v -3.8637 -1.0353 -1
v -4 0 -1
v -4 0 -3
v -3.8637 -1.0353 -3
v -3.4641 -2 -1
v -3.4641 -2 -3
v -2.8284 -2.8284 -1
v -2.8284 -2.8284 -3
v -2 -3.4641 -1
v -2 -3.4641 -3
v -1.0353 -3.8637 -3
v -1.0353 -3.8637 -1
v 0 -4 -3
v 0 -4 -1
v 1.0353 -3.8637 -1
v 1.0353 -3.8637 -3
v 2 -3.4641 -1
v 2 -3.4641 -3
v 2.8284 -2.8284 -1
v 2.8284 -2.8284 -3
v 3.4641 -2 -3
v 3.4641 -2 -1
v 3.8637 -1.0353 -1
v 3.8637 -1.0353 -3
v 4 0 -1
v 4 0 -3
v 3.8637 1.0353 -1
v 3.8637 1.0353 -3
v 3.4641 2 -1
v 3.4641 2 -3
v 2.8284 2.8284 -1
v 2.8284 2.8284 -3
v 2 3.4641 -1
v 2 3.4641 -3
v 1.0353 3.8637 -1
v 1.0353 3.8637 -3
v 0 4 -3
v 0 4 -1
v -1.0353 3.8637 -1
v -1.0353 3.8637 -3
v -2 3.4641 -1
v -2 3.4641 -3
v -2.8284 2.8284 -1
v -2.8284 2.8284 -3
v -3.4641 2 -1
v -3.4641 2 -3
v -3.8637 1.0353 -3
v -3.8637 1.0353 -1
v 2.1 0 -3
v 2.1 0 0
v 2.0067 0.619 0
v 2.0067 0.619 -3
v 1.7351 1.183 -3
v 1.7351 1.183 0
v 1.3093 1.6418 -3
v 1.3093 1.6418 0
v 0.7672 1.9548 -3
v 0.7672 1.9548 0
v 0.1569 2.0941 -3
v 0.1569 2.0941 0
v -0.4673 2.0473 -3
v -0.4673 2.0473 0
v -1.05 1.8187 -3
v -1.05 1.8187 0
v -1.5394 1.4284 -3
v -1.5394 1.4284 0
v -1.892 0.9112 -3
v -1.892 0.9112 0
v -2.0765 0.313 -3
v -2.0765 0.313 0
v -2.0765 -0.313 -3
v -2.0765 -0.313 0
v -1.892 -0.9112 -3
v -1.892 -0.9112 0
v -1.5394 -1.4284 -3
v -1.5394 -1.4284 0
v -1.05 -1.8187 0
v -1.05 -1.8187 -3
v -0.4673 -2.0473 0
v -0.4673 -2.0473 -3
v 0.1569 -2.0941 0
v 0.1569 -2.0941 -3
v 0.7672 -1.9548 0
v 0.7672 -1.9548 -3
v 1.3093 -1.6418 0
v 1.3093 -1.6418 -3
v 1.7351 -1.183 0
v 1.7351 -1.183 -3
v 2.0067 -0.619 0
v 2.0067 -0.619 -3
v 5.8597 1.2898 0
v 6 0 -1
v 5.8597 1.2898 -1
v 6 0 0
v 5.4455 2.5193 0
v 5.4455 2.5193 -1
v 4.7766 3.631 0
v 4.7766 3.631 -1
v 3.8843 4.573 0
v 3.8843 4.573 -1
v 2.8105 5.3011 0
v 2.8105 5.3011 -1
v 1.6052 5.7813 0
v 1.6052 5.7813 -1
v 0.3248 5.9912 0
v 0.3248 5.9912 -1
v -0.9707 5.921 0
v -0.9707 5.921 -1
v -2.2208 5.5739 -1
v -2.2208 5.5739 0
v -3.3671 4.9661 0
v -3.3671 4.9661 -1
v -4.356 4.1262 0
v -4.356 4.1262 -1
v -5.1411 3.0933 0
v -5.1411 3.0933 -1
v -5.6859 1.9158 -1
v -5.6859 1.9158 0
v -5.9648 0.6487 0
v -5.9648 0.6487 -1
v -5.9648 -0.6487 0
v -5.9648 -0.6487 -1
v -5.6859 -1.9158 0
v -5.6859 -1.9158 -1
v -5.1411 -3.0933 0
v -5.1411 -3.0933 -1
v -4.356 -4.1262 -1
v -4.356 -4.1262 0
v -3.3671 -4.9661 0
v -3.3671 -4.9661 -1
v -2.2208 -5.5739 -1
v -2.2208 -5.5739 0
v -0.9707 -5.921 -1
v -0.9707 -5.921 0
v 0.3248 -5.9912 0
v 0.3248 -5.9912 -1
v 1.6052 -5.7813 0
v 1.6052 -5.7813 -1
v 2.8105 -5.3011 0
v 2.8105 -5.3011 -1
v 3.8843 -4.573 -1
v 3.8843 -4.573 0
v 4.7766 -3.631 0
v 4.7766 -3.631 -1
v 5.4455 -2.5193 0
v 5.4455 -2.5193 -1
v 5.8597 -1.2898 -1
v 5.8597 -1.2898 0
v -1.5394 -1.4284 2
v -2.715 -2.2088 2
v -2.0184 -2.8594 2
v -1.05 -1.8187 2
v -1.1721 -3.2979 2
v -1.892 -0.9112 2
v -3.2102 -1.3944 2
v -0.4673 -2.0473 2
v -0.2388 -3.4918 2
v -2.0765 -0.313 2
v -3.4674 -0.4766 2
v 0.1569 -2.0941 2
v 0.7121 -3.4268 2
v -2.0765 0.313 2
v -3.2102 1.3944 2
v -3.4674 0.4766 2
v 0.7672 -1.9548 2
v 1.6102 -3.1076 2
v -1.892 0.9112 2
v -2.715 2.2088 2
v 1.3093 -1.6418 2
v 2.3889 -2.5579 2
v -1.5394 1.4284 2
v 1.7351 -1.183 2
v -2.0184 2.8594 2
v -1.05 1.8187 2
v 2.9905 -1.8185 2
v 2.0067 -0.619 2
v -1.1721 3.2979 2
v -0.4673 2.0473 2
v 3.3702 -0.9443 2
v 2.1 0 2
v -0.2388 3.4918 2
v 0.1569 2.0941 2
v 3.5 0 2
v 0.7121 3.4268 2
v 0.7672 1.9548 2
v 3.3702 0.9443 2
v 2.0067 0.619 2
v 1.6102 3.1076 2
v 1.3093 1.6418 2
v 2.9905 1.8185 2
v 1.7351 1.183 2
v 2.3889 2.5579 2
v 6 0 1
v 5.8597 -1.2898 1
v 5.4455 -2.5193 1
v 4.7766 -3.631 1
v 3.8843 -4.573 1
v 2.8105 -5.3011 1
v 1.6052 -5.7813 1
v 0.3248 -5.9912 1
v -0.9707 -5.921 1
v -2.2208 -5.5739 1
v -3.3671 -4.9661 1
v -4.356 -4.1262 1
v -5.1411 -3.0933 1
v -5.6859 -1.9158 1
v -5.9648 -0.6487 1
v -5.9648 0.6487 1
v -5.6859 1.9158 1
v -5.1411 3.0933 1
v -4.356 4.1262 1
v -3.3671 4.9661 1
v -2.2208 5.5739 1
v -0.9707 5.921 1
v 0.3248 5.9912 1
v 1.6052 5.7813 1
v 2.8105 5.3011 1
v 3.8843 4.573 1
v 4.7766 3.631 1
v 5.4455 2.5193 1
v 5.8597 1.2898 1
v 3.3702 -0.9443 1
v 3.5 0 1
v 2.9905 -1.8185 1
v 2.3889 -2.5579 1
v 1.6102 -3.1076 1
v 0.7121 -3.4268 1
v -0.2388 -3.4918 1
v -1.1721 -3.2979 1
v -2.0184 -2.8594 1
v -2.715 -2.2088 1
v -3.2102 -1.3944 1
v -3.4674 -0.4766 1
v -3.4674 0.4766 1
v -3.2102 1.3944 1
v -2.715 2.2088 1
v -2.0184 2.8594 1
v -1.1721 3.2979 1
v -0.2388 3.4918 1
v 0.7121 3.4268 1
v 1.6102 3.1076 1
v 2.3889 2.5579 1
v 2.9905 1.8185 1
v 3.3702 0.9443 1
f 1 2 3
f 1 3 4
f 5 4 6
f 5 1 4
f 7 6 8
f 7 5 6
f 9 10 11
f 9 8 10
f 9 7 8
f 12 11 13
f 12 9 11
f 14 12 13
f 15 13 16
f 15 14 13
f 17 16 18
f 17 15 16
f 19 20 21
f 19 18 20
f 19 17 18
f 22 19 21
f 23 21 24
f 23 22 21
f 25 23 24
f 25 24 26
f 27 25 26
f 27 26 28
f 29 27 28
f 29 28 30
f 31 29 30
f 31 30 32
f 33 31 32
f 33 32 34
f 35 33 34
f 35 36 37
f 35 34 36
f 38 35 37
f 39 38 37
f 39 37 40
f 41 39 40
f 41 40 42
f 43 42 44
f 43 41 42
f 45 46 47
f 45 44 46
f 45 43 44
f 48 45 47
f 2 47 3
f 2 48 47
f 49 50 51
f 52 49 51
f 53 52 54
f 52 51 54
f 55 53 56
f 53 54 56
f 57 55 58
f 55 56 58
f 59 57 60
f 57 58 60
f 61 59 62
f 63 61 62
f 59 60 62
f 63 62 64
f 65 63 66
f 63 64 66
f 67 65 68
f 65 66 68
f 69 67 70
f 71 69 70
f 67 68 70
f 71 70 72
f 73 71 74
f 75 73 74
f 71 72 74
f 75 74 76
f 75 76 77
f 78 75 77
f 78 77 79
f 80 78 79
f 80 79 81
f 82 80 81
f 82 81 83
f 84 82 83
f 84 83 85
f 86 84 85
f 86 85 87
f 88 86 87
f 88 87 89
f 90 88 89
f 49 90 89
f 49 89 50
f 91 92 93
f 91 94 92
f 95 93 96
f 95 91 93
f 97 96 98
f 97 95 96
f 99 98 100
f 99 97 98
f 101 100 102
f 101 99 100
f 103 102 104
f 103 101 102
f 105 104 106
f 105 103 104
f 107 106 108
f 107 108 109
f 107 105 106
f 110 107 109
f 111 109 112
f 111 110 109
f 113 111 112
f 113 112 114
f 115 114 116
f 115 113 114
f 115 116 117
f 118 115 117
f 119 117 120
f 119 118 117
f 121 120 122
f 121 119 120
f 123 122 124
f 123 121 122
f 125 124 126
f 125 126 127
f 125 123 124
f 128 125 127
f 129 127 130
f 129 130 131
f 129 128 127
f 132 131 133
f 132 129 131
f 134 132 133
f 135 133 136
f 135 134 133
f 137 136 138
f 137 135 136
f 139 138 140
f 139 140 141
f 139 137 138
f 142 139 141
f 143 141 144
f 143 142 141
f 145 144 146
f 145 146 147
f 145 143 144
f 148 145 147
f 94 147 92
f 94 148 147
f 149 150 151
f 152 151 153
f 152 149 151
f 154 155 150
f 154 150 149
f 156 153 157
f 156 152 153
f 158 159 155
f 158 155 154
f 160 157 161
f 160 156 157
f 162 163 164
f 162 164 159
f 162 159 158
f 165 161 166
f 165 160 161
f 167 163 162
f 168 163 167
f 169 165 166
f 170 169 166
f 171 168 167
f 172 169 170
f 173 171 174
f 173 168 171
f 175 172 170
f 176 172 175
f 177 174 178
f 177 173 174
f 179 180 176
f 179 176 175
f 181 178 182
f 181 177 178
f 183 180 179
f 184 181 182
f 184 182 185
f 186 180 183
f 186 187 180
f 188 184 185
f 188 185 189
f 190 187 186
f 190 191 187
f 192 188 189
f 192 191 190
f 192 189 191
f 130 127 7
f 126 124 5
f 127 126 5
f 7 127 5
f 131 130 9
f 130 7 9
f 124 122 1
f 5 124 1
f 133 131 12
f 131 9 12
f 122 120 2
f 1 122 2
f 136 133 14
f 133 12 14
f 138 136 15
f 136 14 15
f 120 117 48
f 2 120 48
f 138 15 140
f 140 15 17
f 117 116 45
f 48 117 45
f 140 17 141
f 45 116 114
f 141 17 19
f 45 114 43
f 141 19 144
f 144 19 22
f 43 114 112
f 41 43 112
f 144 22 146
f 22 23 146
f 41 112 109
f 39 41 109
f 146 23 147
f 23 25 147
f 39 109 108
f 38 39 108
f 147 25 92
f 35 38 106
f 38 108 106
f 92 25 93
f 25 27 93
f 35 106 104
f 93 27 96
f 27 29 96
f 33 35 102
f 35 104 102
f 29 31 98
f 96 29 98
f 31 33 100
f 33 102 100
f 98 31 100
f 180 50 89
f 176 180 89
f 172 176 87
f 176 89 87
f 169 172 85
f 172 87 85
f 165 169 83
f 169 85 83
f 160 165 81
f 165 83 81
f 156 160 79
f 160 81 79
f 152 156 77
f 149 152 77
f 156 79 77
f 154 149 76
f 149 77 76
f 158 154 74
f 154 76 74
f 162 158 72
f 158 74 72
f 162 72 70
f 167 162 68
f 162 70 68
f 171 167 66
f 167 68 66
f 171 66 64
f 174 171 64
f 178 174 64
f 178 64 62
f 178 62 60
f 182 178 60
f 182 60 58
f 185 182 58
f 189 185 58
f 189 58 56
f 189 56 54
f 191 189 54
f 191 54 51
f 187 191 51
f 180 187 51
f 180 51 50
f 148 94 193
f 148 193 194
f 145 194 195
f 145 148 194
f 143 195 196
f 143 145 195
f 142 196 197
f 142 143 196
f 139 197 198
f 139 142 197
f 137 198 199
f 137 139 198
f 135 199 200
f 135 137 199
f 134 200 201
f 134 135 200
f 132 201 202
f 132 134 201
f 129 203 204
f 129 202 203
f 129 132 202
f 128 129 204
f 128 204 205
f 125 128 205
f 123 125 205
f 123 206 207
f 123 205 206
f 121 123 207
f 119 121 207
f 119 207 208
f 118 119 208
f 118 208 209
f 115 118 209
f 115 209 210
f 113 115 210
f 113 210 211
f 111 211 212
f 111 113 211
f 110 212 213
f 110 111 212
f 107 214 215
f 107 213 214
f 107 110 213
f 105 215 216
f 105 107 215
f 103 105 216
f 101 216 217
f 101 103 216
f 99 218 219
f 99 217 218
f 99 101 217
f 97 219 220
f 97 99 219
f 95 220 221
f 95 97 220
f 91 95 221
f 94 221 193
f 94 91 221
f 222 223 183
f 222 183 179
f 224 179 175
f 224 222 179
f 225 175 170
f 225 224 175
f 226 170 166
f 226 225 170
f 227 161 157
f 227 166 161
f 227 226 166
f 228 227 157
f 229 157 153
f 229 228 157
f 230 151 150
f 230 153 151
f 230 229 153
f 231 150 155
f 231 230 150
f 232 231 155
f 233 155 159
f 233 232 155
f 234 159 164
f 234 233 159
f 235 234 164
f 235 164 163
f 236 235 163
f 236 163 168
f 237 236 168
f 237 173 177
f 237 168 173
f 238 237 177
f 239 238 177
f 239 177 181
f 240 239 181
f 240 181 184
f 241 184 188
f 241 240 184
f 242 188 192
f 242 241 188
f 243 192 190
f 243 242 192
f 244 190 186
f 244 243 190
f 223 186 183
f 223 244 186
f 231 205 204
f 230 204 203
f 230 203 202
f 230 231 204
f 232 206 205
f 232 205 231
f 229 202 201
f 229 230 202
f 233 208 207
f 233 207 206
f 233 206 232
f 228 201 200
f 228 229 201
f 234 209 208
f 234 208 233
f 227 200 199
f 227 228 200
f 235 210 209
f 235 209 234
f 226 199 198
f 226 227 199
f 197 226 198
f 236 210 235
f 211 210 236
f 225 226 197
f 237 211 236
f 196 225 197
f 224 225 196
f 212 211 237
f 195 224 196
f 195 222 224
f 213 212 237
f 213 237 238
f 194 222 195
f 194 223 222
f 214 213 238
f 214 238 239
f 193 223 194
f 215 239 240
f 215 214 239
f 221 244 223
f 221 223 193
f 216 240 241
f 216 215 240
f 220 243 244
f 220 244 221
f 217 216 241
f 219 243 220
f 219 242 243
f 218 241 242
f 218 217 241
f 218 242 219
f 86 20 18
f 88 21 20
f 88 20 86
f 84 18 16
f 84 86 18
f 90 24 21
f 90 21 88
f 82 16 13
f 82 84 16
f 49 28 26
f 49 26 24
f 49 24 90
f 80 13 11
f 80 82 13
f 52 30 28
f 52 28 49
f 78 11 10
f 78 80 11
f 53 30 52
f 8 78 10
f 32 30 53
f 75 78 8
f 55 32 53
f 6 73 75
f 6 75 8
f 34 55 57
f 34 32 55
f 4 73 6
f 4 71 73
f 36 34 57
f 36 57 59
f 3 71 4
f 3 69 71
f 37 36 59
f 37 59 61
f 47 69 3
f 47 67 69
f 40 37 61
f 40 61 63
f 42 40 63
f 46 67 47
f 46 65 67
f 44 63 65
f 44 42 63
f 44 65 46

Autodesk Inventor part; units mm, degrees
ref_plane "YZ Plane" through (0, 0, 0) normal (1, 0, 0) x (0, 1, 0)
ref_plane "XZ Plane" through (0, 0, 0) normal (0, 1, 0) x (-1, 0, 0)
ref_plane "XY Plane" through (0, 0, 0) normal (0, 0, 1) x (1, 0, 0)
sketch "Sketch1" plane through (0, 0, 0) normal (0, 0, 1) x (1, 0, 0)
  circle A0 centre (0, 0) radius 6
  dimension "d0" = 12
extrude "Extrusion1" add sketch "Sketch1" along normal mid plane 2
sketch "Sketch2" plane through (0, 0, -1) normal (0, 0, -1) x (-1, 0, 0)
  circle A0 centre (0, 0) radius 4
  dimension "d3" = 8
extrude "Extrusion2" add sketch "Sketch2" along normal blind 2
sketch "Sketch3" plane through (0, 0, 1) normal (0, 0, 1) x (1, 0, 0)
  circle A0 centre (0, 0) radius 3.5
  dimension "d6" = 7
extrude "Extrusion3" add sketch "Sketch3" along normal blind 1
sketch "Sketch4" plane through (0, 0, 0) normal (0, 0, 1) x (1, 0, 0)
  circle A0 centre (0, 0) radius 6 projected
  circle A1 centre (0, 0) radius 2.1
  dimension "d9" = 4.2
extrude "Extrusion4" cut sketch "Sketch4" along normal mid plane 47 contours A1
properties part number "roller bracket" material "Steel"
